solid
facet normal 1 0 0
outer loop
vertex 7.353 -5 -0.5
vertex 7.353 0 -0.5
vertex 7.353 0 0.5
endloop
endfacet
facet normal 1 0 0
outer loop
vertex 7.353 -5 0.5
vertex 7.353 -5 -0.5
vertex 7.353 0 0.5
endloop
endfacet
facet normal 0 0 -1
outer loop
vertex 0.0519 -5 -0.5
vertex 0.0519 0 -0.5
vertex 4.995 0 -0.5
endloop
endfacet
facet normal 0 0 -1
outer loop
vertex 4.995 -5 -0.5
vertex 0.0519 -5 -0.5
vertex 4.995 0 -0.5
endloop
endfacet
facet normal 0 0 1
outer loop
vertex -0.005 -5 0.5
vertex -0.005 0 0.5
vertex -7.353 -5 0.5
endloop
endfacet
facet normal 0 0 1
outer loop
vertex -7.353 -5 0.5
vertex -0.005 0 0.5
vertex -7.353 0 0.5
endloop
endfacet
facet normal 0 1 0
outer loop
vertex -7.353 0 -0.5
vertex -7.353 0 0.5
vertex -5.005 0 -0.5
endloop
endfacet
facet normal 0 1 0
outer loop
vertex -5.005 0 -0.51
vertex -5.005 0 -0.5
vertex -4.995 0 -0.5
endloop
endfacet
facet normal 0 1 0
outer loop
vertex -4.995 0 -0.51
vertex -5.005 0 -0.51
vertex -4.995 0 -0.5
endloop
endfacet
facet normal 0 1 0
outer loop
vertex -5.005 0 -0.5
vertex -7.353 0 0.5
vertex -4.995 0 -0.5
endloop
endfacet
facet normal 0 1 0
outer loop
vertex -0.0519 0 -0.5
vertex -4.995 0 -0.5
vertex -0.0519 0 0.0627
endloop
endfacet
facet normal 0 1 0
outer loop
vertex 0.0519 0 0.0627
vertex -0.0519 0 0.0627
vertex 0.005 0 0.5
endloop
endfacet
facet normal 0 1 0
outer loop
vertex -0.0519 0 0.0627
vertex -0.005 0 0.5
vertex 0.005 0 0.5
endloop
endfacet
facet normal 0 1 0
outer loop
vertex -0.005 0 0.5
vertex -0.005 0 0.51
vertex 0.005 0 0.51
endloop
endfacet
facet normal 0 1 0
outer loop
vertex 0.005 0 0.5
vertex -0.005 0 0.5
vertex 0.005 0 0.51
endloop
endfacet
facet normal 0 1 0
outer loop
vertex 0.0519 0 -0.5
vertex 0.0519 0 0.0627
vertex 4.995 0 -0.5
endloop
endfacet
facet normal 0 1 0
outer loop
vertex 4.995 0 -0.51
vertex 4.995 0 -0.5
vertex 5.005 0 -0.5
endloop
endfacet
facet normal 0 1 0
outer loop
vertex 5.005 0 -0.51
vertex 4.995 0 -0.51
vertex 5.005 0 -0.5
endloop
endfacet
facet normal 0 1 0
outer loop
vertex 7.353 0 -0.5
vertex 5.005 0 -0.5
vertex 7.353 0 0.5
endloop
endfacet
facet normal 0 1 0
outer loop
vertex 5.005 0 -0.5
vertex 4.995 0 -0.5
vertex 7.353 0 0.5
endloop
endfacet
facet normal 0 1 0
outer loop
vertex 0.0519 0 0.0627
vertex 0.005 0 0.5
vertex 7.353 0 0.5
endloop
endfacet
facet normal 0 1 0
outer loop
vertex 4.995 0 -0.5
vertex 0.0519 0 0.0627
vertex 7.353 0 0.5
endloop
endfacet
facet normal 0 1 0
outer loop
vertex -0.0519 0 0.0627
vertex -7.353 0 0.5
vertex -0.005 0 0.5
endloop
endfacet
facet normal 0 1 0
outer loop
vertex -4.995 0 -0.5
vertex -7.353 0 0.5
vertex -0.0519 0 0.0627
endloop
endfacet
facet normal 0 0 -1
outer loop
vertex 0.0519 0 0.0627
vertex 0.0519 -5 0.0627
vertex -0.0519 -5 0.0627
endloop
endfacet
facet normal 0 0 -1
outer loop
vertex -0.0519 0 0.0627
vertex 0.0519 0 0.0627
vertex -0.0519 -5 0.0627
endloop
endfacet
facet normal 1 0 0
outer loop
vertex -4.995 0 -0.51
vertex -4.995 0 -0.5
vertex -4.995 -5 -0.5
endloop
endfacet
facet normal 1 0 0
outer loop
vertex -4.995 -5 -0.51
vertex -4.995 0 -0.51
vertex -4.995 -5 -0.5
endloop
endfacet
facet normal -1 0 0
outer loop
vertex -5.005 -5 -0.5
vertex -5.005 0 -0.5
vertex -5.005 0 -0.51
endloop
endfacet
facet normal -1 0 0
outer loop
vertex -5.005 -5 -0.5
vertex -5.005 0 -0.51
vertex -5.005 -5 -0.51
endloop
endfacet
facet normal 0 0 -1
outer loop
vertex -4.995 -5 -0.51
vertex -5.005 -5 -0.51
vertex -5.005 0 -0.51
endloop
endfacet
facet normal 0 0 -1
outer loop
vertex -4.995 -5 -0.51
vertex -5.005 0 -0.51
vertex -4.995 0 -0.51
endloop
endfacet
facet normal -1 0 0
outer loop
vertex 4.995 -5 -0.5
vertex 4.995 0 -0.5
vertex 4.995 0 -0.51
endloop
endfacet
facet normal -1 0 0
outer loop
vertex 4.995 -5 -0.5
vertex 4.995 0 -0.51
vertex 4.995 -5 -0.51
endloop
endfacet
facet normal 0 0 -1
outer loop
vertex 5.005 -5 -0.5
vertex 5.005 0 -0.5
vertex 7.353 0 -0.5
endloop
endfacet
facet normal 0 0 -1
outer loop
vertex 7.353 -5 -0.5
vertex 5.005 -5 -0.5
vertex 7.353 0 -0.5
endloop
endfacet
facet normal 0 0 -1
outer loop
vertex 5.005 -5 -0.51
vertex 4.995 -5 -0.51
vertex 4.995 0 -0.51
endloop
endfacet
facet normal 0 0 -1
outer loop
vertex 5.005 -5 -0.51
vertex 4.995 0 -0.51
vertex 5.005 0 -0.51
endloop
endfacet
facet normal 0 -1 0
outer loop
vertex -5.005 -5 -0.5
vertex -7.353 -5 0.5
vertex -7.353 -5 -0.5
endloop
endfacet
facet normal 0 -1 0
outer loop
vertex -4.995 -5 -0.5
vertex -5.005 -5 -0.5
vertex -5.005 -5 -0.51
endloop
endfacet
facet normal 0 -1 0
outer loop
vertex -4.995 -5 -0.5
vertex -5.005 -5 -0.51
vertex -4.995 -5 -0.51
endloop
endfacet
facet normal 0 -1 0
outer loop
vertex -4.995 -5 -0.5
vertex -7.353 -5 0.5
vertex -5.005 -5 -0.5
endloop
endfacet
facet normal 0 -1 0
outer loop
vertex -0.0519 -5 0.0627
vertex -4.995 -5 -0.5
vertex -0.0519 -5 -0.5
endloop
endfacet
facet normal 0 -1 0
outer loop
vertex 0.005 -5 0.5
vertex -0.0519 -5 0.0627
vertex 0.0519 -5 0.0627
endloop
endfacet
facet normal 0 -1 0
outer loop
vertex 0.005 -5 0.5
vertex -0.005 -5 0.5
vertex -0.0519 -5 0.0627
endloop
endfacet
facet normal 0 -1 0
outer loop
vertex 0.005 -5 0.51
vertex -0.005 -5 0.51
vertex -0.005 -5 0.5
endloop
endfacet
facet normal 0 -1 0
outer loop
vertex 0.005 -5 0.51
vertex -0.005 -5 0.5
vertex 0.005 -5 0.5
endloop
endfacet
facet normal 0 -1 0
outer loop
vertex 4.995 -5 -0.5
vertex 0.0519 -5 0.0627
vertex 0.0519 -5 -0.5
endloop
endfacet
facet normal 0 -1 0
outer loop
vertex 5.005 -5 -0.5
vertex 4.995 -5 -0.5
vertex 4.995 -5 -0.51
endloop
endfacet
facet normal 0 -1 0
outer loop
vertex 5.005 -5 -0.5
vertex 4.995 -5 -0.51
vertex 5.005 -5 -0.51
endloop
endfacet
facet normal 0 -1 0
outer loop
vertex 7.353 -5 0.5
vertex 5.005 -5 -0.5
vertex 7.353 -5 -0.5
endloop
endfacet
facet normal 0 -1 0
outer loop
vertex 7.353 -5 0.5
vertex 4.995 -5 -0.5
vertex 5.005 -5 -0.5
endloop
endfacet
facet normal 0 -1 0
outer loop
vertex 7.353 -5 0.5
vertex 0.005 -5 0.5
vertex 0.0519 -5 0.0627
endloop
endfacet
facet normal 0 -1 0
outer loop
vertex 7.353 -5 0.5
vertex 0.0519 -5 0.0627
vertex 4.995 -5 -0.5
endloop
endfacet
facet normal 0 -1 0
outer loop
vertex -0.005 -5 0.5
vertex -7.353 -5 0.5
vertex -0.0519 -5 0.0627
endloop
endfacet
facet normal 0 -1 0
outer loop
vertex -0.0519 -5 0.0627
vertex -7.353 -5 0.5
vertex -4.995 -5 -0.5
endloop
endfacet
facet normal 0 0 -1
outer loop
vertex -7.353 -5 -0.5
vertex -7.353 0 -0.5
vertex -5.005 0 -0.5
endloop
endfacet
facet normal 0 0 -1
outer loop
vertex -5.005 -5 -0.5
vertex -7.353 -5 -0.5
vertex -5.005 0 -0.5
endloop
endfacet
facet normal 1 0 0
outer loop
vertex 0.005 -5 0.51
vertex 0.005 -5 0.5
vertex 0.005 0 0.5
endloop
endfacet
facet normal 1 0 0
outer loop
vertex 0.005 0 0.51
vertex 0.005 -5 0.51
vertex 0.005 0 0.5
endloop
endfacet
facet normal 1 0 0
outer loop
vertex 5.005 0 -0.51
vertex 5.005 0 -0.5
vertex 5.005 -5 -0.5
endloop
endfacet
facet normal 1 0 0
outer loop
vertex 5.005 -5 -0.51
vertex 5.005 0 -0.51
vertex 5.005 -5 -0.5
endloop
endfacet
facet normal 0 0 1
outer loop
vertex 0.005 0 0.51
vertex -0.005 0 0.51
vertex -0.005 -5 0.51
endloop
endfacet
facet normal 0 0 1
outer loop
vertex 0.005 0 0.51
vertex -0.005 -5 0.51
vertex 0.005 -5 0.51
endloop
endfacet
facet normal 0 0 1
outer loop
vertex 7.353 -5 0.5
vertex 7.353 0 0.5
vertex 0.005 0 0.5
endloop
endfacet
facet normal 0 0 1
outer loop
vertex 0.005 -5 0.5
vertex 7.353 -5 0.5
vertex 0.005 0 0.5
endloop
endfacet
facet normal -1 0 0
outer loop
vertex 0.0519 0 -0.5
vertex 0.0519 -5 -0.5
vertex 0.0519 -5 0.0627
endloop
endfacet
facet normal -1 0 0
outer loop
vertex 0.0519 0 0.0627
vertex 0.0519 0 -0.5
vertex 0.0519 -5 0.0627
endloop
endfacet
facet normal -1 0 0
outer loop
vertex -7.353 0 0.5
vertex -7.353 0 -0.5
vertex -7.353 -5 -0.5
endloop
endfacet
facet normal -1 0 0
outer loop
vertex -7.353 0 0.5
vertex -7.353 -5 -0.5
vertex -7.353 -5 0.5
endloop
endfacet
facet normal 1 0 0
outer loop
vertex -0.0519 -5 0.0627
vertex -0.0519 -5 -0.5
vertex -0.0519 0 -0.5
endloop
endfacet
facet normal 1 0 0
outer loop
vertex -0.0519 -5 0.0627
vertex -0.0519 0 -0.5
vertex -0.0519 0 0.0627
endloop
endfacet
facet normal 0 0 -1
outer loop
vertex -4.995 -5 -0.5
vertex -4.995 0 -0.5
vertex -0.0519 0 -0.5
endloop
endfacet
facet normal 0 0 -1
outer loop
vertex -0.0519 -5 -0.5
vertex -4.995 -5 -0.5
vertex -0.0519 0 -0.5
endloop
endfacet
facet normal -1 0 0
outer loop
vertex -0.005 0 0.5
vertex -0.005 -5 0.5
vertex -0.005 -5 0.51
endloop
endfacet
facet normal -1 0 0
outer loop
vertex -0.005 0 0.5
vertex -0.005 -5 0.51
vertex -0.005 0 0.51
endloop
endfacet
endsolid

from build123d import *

# Parameters (mm, degrees)
F0_W     = 7.35295
F0_H     = 1
F1_DEPTH = 5
F2_W     = 0.051922
F2_H     = 0.562747
F3_DEPTH = 5.001
F4_W     = 0.005
F4_H     = 5
F5_DEPTH = 0.01
F6_W     = 0.005
F6_H     = 5
F7_DEPTH = 0.01


with BuildPart() as f1:
    # F0 (on Front) → F1 (new body)
    with BuildSketch(Plane.XZ):
        with Locations((3.676475, 0)):
            Rectangle(F0_W, F0_H)
        with Locations((-3.676475, 0)):
            Rectangle(F0_W, F0_H)
    extrude(amount=F1_DEPTH)

    # F2 (on face) → F3 (cut, through all)
    with BuildSketch(Plane.XZ.offset(5)):
        with Locations((-0.025961, -0.218627)):
            Rectangle(F2_W, F2_H)
        with Locations((0.025961, -0.218627)):
            Rectangle(F2_W, F2_H)
    extrude(amount=-F3_DEPTH, mode=Mode.SUBTRACT)

    # F4 (on face) → F5 (join)
    with BuildSketch(Plane.XY.offset(0.5)):
        with Locations((-0.0025, -2.5)):
            Rectangle(F4_W, F4_H)
        with Locations((0.0025, -2.5)):
            Rectangle(F4_W, F4_H)
    extrude(amount=F5_DEPTH)

    # F6 (on face) → F7 (join)
    with BuildSketch(Plane(origin=(0, 0, -0.5), x_dir=(1, 0, 0), z_dir=(0, 0, -1))):
        with Locations((-4.9975, 2.5)):
            Rectangle(F6_W, F6_H)
        with Locations((-5.0025, 2.5)):
            Rectangle(F6_W, F6_H)
        with Locations((5.0025, 2.5)):
            Rectangle(F6_W, F6_H)
        with Locations((4.9975, 2.5)):
            Rectangle(F6_W, F6_H)
    extrude(amount=F7_DEPTH)


solid = f1.part
